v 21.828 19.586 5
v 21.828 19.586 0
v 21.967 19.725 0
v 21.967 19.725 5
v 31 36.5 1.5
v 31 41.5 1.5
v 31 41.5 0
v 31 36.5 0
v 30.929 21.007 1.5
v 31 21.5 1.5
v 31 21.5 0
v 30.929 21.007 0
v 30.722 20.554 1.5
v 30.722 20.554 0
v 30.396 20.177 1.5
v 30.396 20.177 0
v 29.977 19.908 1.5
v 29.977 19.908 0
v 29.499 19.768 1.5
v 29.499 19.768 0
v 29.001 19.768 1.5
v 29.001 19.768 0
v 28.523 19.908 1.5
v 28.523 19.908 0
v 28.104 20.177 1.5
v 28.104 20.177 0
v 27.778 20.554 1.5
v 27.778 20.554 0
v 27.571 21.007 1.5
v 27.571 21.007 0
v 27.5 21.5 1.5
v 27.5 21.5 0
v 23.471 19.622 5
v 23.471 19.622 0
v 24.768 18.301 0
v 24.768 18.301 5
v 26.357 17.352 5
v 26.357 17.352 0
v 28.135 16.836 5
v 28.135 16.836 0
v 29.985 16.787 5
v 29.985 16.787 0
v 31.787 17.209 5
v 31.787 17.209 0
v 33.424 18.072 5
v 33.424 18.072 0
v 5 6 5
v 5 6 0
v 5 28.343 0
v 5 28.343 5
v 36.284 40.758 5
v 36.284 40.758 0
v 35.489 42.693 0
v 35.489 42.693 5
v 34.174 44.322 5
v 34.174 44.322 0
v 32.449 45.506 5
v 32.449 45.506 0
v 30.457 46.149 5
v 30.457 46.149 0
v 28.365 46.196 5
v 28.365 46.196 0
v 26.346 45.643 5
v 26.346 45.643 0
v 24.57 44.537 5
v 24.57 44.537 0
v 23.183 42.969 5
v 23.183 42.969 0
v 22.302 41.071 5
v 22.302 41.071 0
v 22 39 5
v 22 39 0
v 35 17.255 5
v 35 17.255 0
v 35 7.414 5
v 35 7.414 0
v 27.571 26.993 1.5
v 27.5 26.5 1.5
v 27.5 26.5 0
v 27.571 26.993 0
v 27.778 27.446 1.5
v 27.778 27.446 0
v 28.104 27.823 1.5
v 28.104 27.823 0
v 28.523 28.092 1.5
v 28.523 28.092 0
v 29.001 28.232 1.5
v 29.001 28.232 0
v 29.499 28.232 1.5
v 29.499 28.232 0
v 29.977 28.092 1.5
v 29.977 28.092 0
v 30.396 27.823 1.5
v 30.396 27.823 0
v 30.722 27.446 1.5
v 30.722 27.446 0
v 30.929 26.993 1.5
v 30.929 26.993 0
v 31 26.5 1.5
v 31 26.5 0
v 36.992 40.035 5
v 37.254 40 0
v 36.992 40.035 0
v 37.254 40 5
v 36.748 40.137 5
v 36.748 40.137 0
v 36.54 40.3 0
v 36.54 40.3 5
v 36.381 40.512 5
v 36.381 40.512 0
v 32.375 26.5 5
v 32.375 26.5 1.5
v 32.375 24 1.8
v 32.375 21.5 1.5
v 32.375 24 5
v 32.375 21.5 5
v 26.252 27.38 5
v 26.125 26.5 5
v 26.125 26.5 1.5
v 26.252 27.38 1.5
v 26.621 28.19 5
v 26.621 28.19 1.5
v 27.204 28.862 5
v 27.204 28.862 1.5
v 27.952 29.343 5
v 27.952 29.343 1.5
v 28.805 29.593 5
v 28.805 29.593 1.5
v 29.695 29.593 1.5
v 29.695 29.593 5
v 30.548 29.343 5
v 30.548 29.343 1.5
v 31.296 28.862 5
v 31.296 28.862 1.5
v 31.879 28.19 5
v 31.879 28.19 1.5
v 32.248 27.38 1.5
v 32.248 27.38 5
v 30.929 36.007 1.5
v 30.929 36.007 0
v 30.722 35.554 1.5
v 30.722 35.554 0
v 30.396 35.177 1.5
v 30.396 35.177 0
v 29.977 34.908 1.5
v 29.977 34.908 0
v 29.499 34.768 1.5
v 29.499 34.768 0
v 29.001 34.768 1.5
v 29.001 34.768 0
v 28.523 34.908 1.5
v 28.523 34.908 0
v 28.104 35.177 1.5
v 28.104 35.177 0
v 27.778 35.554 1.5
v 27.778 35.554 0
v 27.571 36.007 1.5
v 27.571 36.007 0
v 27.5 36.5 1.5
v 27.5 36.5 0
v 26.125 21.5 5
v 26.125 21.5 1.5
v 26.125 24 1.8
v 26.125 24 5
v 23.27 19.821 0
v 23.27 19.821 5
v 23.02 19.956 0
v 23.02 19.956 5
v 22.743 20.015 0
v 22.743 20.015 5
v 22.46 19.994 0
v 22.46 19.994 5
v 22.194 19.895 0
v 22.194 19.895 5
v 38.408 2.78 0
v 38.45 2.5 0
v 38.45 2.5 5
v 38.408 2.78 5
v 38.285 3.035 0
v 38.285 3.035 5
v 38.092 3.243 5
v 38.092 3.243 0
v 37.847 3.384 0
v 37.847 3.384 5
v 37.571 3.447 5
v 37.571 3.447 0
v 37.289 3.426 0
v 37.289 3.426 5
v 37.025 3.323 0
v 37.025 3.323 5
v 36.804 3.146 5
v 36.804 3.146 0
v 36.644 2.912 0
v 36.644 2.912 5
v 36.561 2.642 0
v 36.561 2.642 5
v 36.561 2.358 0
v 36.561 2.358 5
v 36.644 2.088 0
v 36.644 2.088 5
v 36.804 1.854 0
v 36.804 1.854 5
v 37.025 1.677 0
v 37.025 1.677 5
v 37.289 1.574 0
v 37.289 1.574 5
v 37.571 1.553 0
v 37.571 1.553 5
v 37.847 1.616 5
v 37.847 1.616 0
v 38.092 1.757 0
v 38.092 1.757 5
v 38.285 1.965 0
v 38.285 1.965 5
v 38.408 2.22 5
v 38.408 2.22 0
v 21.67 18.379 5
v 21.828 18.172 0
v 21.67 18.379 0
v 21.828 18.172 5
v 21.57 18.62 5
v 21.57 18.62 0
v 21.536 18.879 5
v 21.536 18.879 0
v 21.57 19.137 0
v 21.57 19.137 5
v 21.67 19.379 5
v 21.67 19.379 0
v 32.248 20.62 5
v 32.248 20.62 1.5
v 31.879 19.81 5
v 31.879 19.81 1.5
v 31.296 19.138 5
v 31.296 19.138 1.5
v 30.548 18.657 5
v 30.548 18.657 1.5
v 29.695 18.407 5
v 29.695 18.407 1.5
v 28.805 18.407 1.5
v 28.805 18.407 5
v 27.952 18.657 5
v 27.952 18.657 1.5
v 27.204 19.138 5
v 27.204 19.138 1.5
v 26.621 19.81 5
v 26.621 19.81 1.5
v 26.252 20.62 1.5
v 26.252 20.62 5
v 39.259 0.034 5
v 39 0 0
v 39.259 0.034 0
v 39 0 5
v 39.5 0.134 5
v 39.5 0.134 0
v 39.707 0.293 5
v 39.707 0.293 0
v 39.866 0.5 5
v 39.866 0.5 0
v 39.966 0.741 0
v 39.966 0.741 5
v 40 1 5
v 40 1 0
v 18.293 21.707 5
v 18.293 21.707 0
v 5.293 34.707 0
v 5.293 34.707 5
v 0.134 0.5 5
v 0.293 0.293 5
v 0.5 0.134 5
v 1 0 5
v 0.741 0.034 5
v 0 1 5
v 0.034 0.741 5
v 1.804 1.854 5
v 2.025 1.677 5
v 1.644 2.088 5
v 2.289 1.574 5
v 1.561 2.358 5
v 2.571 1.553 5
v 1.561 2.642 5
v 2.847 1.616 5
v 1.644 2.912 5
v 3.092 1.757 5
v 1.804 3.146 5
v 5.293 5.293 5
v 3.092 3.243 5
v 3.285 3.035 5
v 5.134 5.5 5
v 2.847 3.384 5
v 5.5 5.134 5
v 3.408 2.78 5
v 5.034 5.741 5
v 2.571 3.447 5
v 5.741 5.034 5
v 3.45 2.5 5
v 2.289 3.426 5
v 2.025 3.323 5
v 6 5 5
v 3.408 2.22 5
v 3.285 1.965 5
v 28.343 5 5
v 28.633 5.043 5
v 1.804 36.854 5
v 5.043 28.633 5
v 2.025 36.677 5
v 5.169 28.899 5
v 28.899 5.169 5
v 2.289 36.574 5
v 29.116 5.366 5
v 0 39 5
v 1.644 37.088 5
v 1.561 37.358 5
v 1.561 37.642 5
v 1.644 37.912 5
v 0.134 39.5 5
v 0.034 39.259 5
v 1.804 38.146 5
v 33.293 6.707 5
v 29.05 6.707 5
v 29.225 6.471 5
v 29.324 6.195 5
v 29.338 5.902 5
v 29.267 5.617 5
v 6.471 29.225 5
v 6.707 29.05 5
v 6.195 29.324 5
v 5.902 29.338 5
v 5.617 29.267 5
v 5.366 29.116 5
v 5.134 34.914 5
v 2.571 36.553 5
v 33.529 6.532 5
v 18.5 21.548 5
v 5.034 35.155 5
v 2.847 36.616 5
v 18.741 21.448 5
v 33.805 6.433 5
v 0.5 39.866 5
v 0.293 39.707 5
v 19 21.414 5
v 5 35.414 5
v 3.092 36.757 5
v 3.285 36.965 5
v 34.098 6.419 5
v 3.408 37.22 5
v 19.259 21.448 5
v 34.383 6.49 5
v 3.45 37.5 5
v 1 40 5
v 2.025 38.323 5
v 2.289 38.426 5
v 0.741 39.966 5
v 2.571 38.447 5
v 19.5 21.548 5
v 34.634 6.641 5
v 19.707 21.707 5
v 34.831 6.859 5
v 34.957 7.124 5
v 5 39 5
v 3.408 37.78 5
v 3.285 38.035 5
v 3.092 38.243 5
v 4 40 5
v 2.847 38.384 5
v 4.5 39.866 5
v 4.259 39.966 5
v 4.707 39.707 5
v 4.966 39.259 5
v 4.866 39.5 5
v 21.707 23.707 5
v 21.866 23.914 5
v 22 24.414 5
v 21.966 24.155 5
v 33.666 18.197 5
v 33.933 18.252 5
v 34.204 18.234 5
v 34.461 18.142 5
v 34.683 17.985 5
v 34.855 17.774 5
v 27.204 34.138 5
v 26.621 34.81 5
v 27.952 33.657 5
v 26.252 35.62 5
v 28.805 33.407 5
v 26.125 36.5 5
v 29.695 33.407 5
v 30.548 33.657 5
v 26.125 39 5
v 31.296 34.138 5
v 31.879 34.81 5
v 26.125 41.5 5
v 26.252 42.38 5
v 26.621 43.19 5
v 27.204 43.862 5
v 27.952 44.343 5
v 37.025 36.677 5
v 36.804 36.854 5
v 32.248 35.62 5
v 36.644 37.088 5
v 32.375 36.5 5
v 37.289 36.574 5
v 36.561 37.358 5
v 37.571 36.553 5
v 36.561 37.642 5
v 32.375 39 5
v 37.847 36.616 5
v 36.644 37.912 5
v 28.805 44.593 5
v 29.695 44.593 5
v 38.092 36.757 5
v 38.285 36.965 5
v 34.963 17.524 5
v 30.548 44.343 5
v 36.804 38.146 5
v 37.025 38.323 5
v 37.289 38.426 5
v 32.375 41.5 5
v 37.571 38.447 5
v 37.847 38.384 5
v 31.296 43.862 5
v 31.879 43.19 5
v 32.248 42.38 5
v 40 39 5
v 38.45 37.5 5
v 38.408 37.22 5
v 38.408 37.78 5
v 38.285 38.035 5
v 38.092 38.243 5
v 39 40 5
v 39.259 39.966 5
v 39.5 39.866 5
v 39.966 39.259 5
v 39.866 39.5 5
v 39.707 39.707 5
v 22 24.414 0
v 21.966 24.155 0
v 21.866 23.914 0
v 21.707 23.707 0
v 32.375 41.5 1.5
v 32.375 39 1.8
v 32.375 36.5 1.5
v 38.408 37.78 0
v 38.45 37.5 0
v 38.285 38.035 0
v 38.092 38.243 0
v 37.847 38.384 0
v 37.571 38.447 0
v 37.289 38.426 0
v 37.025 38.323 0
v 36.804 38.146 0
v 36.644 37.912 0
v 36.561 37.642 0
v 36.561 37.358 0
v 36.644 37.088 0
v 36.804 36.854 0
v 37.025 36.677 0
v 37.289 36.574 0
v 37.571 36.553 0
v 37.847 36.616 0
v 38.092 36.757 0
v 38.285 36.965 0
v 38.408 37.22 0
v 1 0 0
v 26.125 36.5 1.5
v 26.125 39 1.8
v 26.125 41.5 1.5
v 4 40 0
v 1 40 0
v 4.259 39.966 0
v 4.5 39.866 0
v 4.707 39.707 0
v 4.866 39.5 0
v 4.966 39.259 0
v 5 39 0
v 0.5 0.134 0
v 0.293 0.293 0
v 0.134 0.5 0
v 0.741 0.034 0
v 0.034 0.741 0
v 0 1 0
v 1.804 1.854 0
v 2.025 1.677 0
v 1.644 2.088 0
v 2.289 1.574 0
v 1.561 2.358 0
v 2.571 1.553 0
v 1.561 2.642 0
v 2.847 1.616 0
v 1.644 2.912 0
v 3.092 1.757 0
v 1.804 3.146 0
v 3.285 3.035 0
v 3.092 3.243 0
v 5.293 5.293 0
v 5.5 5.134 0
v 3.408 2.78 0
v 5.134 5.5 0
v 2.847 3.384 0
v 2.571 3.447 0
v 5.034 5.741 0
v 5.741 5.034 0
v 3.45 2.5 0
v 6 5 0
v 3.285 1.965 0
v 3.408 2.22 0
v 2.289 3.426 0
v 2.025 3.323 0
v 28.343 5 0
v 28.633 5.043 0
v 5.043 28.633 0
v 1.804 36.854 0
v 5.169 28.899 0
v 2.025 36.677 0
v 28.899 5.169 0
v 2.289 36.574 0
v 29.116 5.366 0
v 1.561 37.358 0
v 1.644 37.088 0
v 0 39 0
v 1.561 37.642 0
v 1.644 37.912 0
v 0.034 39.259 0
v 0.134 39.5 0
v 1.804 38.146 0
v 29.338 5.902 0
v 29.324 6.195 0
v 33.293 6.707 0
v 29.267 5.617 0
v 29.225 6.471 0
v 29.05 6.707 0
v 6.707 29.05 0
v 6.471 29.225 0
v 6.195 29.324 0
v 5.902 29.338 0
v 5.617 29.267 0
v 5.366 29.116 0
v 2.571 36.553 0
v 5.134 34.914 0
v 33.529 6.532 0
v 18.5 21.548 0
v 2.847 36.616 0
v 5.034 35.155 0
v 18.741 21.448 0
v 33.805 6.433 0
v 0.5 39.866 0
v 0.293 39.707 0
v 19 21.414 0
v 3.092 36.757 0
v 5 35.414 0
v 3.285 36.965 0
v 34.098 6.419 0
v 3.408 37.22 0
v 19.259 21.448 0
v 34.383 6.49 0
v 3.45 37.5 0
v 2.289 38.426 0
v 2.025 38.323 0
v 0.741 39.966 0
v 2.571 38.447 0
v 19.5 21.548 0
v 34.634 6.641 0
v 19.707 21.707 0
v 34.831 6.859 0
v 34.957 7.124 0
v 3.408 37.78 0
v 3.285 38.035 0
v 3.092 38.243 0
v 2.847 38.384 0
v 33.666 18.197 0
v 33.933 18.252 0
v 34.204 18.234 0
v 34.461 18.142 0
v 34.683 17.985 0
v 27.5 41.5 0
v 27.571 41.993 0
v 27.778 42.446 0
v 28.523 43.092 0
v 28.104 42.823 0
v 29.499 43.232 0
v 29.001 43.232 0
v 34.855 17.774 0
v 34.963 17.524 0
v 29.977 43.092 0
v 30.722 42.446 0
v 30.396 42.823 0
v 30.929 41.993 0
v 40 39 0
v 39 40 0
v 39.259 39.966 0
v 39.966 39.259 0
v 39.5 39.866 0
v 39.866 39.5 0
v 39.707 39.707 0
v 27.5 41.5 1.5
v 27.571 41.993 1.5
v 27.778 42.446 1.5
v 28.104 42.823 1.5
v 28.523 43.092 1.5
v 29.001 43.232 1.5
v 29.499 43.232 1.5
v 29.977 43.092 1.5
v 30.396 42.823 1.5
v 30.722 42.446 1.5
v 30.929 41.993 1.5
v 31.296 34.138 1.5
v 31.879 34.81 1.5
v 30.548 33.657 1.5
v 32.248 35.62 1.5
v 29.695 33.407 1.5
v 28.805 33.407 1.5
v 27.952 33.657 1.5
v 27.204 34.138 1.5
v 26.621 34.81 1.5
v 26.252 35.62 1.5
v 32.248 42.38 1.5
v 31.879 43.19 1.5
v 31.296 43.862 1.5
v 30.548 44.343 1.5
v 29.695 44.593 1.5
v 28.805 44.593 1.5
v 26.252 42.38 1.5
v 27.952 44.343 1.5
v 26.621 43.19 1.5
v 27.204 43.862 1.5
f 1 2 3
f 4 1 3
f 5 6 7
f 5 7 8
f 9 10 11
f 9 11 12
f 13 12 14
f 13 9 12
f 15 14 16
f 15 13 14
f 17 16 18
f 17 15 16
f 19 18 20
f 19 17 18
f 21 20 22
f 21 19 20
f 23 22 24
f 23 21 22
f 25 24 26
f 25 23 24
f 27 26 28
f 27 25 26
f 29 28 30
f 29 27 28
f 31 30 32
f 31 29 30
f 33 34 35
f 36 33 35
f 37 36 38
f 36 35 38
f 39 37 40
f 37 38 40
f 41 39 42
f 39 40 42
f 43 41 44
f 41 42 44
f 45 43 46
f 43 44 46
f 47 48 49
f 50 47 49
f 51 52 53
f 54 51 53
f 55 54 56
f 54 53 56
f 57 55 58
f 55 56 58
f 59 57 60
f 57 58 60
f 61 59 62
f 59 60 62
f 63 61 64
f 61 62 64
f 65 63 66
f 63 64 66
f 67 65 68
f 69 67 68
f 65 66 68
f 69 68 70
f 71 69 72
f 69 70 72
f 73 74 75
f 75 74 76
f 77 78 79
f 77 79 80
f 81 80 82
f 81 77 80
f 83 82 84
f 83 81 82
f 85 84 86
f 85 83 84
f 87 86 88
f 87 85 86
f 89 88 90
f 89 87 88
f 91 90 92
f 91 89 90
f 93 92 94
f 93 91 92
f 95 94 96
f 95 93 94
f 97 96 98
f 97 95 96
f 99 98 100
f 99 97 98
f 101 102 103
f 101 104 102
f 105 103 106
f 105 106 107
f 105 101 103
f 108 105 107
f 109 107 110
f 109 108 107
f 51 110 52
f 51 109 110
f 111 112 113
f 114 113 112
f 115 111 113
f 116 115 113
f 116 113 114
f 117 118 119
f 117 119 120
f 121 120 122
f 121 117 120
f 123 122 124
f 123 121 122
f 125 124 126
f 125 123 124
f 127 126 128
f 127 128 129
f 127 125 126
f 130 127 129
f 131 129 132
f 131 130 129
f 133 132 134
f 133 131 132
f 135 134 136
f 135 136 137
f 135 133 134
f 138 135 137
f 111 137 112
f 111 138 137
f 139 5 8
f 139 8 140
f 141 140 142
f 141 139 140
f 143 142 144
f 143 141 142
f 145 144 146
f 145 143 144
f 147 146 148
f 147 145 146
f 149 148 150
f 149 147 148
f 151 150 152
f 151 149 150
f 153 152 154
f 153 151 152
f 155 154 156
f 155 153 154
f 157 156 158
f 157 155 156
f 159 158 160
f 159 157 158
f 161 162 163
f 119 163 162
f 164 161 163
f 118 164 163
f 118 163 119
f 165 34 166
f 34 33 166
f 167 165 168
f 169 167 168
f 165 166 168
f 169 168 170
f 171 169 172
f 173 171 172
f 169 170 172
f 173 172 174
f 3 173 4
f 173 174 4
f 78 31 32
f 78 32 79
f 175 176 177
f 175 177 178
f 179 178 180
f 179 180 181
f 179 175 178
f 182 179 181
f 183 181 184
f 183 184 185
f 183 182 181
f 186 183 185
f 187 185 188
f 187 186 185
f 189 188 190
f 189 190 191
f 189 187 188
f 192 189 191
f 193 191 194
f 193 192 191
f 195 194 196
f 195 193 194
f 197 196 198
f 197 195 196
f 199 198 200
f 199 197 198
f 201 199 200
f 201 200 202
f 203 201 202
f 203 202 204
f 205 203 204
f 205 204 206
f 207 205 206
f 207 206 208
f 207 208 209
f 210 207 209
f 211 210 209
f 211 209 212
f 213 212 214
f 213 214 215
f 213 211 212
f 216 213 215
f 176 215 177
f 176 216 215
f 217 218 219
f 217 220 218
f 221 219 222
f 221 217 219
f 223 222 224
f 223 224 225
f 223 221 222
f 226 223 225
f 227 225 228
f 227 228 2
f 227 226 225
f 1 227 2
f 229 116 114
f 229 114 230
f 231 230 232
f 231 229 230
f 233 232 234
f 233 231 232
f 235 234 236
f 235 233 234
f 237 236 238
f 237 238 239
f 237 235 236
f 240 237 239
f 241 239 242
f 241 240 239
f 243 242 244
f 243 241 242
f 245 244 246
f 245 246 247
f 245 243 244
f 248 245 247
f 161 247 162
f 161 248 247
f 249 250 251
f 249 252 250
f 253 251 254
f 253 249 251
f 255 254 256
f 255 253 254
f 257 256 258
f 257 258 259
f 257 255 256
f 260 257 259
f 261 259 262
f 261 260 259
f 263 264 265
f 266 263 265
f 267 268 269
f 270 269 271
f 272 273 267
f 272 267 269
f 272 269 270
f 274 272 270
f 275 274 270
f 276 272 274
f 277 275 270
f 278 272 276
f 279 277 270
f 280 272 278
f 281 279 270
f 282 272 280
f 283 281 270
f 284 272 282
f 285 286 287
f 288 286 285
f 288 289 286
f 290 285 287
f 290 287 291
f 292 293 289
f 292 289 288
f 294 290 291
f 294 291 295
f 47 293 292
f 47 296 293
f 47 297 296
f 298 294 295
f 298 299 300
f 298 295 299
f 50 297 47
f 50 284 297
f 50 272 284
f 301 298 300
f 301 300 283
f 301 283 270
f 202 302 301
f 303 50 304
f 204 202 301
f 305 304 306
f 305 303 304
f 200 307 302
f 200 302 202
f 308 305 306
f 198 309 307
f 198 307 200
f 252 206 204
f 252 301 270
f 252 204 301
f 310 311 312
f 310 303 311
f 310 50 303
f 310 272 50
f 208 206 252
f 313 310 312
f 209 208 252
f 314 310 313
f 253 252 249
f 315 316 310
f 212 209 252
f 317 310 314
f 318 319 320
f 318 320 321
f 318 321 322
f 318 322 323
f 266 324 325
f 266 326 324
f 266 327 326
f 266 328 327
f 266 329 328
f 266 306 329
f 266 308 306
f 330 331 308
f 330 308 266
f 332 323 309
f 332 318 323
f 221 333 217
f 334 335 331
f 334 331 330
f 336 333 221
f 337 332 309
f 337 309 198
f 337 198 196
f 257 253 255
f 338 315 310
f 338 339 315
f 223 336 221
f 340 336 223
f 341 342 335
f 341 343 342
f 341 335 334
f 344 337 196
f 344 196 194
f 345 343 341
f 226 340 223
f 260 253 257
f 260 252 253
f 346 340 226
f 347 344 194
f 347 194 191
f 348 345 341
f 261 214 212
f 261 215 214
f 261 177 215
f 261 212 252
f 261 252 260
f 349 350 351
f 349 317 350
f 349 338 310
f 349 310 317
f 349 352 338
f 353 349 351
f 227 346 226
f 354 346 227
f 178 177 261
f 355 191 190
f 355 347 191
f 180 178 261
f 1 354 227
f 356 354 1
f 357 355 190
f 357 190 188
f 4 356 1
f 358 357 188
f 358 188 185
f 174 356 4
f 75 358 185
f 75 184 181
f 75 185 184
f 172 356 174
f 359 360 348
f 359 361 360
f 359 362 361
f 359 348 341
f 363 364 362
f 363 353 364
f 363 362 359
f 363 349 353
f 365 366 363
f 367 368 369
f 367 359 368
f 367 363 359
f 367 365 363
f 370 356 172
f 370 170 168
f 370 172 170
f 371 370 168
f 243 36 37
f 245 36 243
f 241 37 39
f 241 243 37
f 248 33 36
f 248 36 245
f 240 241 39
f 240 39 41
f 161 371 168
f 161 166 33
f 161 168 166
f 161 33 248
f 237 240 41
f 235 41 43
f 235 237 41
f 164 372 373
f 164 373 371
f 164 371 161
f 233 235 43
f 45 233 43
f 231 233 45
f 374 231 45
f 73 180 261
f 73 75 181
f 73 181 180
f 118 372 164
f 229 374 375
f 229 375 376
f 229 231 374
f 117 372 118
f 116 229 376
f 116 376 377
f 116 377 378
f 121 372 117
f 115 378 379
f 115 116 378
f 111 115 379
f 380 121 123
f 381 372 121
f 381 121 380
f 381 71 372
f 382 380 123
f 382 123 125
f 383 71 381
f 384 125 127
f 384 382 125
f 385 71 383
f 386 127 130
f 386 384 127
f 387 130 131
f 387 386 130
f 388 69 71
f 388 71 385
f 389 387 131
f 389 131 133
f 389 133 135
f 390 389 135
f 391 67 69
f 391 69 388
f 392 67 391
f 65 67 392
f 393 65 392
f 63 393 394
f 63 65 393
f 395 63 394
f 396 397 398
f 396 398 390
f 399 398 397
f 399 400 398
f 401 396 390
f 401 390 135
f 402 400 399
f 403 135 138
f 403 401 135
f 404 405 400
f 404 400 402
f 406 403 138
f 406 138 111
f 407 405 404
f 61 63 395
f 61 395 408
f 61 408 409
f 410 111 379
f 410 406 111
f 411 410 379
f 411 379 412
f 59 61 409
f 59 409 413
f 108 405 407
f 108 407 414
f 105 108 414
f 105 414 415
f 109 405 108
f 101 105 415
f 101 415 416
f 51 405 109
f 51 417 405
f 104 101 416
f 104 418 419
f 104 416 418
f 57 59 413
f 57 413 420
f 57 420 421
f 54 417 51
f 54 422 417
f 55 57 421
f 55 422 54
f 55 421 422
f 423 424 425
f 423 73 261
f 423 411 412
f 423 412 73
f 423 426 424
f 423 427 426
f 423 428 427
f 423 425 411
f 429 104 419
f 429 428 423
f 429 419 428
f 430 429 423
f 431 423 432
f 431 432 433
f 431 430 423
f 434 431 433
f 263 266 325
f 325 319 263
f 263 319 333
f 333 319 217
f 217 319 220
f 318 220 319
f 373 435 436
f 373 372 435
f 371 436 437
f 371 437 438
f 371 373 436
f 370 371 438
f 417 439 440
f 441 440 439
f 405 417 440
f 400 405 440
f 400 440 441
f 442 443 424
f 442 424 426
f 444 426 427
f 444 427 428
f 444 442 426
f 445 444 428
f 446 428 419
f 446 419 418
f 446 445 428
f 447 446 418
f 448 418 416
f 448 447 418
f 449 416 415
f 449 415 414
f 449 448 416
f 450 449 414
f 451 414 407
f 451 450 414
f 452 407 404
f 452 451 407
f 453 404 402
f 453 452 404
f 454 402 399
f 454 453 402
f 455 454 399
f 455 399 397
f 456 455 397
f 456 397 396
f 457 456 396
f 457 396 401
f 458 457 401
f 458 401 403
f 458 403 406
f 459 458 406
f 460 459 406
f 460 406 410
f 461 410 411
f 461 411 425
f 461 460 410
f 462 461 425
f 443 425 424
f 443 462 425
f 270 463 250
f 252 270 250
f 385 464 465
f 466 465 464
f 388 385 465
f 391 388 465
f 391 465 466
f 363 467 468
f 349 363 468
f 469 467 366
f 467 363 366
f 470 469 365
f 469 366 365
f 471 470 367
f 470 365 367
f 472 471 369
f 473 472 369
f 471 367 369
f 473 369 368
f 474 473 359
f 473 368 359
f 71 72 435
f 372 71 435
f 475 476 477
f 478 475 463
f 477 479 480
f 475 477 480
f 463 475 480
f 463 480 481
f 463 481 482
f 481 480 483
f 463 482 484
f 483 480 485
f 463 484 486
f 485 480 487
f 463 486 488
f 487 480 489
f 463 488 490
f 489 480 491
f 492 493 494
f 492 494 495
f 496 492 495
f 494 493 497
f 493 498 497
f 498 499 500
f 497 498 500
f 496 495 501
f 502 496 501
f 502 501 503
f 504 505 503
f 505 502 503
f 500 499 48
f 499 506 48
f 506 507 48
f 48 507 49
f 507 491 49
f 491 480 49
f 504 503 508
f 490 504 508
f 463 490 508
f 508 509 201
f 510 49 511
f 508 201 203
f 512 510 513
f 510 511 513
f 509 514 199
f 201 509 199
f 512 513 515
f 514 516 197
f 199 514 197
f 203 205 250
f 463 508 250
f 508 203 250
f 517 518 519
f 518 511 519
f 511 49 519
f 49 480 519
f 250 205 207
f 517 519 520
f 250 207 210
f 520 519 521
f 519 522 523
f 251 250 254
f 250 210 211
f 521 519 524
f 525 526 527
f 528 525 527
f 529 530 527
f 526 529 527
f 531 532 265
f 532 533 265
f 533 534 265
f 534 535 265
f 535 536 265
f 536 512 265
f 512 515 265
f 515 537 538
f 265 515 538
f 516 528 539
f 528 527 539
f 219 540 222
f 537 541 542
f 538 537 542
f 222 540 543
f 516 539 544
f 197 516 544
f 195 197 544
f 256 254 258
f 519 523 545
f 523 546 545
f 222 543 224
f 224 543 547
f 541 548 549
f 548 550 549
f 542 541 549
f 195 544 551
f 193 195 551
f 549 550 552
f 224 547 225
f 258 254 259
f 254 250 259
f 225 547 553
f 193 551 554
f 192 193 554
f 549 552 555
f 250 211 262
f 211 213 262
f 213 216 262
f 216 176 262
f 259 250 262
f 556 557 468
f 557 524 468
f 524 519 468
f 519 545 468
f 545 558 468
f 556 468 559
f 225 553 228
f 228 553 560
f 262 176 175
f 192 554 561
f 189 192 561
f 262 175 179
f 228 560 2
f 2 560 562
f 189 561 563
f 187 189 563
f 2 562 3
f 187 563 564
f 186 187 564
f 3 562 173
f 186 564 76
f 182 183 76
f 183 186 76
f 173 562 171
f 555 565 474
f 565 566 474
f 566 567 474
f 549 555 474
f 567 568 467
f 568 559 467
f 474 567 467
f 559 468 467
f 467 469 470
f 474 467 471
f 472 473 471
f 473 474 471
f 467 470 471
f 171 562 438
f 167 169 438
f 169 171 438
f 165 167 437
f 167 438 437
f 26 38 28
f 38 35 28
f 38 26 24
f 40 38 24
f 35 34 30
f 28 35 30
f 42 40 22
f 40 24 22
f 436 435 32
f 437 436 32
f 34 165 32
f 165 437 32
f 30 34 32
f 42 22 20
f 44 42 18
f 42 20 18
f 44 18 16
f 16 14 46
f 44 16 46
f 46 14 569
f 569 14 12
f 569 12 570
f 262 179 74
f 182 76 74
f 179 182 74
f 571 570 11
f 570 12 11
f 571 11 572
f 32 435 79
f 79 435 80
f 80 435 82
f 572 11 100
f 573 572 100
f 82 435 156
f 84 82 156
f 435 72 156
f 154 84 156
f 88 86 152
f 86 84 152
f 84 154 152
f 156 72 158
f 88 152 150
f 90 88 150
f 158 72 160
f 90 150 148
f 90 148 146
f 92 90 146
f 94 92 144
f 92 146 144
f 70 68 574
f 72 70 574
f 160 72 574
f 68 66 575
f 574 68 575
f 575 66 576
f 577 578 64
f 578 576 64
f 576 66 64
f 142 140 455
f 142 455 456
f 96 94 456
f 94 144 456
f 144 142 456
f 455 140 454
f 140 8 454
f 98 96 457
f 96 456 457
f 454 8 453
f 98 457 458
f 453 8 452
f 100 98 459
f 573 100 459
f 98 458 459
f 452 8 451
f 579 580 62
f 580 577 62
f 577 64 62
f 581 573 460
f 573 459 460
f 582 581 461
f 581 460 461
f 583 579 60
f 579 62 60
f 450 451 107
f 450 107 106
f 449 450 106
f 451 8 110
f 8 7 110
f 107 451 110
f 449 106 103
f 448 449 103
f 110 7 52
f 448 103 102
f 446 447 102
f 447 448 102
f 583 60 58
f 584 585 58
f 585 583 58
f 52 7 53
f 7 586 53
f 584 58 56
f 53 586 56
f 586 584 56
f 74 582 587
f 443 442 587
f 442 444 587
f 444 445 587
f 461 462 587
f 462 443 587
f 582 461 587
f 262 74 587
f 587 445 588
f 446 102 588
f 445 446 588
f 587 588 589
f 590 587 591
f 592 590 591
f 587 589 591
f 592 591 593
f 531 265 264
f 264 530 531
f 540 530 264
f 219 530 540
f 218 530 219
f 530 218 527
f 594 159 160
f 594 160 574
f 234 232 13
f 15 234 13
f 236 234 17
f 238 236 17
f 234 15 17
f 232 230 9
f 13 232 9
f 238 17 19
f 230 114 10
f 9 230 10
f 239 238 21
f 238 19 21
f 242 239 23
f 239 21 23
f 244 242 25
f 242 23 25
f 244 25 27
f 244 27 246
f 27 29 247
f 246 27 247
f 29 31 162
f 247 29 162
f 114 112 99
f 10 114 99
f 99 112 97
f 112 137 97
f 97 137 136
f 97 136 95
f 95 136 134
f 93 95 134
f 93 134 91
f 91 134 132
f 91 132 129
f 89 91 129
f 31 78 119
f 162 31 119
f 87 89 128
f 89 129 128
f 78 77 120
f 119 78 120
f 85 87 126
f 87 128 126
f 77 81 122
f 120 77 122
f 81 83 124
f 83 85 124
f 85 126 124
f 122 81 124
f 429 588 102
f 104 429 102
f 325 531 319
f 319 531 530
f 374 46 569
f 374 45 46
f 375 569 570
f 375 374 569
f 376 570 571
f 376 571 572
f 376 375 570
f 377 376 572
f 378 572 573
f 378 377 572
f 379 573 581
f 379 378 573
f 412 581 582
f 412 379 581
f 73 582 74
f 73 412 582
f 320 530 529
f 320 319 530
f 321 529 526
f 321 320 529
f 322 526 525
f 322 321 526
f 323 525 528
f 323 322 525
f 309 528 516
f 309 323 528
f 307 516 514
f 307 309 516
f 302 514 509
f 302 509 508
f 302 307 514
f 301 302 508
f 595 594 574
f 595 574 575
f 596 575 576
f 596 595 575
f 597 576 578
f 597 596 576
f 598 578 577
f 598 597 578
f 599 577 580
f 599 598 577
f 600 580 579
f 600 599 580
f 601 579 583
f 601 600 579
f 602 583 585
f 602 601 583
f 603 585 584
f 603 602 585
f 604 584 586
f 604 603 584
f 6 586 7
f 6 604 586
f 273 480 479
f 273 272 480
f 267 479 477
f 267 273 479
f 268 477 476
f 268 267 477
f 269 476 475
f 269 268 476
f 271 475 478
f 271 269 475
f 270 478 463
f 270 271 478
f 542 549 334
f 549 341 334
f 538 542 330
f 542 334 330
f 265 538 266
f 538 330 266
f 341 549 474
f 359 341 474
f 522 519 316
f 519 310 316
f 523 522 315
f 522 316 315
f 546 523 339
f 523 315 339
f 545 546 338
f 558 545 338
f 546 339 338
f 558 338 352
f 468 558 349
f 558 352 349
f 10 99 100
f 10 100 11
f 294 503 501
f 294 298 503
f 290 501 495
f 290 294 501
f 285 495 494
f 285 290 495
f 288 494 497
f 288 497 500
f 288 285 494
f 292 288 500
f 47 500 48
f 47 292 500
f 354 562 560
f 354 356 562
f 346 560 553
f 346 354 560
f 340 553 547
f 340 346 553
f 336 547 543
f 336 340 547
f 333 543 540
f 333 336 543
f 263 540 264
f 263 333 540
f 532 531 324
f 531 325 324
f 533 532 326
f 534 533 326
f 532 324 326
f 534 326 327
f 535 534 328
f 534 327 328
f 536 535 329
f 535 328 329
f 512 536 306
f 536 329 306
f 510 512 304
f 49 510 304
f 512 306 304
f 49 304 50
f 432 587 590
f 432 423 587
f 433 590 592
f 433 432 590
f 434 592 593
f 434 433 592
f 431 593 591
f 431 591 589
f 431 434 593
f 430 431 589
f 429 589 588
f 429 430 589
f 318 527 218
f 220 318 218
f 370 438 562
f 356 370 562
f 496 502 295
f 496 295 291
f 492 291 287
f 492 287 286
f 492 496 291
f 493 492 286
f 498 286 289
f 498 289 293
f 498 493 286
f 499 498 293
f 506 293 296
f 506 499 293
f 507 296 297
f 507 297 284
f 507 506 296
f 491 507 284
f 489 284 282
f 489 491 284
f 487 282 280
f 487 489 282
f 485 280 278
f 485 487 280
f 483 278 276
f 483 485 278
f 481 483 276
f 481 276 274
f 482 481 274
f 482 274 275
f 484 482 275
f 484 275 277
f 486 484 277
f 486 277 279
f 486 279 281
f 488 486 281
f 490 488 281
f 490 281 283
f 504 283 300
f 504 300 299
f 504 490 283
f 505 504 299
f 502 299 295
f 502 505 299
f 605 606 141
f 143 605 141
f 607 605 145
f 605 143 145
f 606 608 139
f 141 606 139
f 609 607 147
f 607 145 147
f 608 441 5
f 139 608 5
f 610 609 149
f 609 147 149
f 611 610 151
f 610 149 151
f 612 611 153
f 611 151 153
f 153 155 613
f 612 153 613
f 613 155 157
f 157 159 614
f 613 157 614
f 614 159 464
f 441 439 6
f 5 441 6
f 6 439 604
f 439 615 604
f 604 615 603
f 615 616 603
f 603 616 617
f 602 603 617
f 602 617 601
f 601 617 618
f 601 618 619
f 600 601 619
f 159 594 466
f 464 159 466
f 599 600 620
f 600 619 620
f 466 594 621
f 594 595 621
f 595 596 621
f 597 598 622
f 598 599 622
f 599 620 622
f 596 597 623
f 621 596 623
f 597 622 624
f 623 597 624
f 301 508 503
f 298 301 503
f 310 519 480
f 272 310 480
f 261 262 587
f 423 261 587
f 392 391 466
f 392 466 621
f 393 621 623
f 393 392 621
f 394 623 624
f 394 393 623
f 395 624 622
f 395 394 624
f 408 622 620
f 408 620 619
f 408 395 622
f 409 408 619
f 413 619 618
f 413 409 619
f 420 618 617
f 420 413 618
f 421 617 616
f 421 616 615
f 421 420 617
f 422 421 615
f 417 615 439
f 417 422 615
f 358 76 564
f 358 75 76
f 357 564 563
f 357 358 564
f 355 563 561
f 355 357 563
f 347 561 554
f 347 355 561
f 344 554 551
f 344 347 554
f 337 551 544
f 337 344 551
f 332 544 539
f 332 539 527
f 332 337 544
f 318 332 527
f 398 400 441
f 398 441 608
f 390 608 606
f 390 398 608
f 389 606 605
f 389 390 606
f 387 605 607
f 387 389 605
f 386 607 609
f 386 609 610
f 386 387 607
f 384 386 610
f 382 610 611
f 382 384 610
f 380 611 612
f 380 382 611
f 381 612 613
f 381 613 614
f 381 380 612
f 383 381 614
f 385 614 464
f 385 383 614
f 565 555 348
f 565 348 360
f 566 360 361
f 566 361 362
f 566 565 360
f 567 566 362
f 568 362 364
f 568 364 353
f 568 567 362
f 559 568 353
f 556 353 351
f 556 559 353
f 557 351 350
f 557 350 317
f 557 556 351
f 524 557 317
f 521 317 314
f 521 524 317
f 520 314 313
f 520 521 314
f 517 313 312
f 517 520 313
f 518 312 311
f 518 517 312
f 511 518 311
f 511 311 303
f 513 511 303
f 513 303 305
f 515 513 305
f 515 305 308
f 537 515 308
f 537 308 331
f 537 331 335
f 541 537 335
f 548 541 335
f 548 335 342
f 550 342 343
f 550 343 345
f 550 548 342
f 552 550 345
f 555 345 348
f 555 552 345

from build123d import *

# Parameters (mm, degrees)
SKETCH1_R           = 0.95
SKETCH1_R_2         = 1.75
BOSS_EXTRUDE1_DEPTH = 5
SKETCH6_R           = 3.125
CUT_EXTRUDE1_DEPTH  = 3.2
CUT_EXTRUDE2_DEPTH  = 62.351955959
CUT_EXTRUDE3_DEPTH  = 3.5
FILLET1_R           = 1


with BuildPart() as part:
    # Sketch1 → Boss-Extrude1 (new body)
    with BuildSketch(Plane.XY):
        with BuildLine():
            Line((0, 40), (0, 0))
            Line((0, 0), (40, 0))
            Line((40, 0), (40, 40))
            Line((40, 40), (36.430703308, 40))
            ThreePointArc((36.430703308, 40), (28.74880093, 46.232655079), (22, 39))
            Line((22, 39), (22, 24))
            Line((22, 24), (19, 21))
            Line((19, 21), (5, 35))
            Line((5, 35), (5, 40))
            Line((5, 40), (0, 40))
        make_face()
        Polygon((5, 5), (5, 30.757359313), (30.757359313, 5), align=None, mode=Mode.SUBTRACT)
        with BuildLine():
            Line((35, 19.584119567), (35, 5))
            Line((35, 5), (21.121320344, 18.878679656))
            Line((21.121320344, 18.878679656), (22.845279894, 20.602639207))
            ThreePointArc((22.845279894, 20.602639207), (28.644599167, 16.77532078), (35, 19.584119567))
        make_face(mode=Mode.SUBTRACT)
        with Locations((2.5, 2.5)):
            Circle(SKETCH1_R, mode=Mode.SUBTRACT)
        with Locations((37.5, 2.5)):
            Circle(SKETCH1_R, mode=Mode.SUBTRACT)
        with Locations((2.5, 37.5)):
            Circle(SKETCH1_R, mode=Mode.SUBTRACT)
        with Locations((37.5, 37.5)):
            Circle(SKETCH1_R, mode=Mode.SUBTRACT)
        with Locations((29.25, 39)):
            Circle(SKETCH1_R_2, mode=Mode.SUBTRACT)
        with Locations((29.25, 24)):
            Circle(SKETCH1_R_2, mode=Mode.SUBTRACT)
    extrude(amount=BOSS_EXTRUDE1_DEPTH)

    # Sketch6 → Cut-Extrude1 (cut)
    with BuildSketch(Plane.XY.offset(5)):
        with Locations((29.25, 39)):
            Circle(SKETCH6_R)
        with Locations((29.25, 24)):
            Circle(SKETCH6_R)
    extrude(amount=-CUT_EXTRUDE1_DEPTH, mode=Mode.SUBTRACT)

    # Sketch7 → Cut-Extrude2 (cut, through all)
    with BuildSketch(Plane.XY.offset(5)):
        with BuildLine():
            Line((27.5, 26.5), (27.5, 21.5))
            ThreePointArc((27.5, 21.5), (29.25, 19.75), (31, 21.5))
            Line((31, 21.5), (31, 26.5))
            ThreePointArc((31, 26.5), (29.25, 28.25), (27.5, 26.5))
        make_face()
        with BuildLine():
            Line((27.5, 41.5), (27.5, 36.5))
            ThreePointArc((27.5, 36.5), (29.25, 34.75), (31, 36.5))
            Line((31, 36.5), (31, 41.5))
            ThreePointArc((31, 41.5), (29.25, 43.25), (27.5, 41.5))
        make_face()
    extrude(amount=-CUT_EXTRUDE2_DEPTH, mode=Mode.SUBTRACT)

    # Sketch7<3> → Cut-Extrude3 (cut)
    # profile 1 of 2: a face of its own
    with BuildSketch(Plane.XY.offset(5)):
        with BuildLine():
            Line((32.375, 26.5), (32.375, 21.5))
            ThreePointArc((32.375, 21.5), (29.25, 18.375), (26.125, 21.5))
            Line((26.125, 21.5), (26.125, 26.5))
            ThreePointArc((26.125, 26.5), (29.25, 29.625), (32.375, 26.5))
        make_face()
        with BuildLine():
            Line((31, 26.5), (31, 21.5))
            ThreePointArc((31, 21.5), (29.25, 19.75), (27.5, 21.5))
            Line((27.5, 21.5), (27.5, 26.5))
            ThreePointArc((27.5, 26.5), (29.25, 28.25), (31, 26.5))
        make_face(mode=Mode.SUBTRACT)
    # profile 2 of 2: a face of its own
    with BuildSketch(Plane.XY.offset(5)):
        with BuildLine():
            Line((32.375, 41.5), (32.375, 36.5))
            ThreePointArc((32.375, 36.5), (29.25, 33.375), (26.125, 36.5))
            Line((26.125, 36.5), (26.125, 41.5))
            ThreePointArc((26.125, 41.5), (29.25, 44.625), (32.375, 41.5))
        make_face()
        with BuildLine():
            Line((31, 41.5), (31, 36.5))
            ThreePointArc((31, 36.5), (29.25, 34.75), (27.5, 36.5))
            Line((27.5, 36.5), (27.5, 41.5))
            ThreePointArc((27.5, 41.5), (29.25, 43.25), (31, 41.5))
        make_face(mode=Mode.SUBTRACT)
    extrude(amount=-CUT_EXTRUDE3_DEPTH, mode=Mode.SUBTRACT)

    # Fillet1
    fillet1_edges = [part.edges().sort_by_distance(p)[0] for p in [
        (5, 30.757359313, 2.5),
        (40, 40, 2.5),
        (36.430703308, 40, 2.5),
        (35, 19.584119567, 2.5),
        (22.845279894, 20.602639207, 2.5),
        (21.121320344, 18.878679656, 2.5),
        (22, 24, 2.5),
        (19, 21, 2.5),
        (30.757359313, 5, 2.5),
        (35, 5, 2.5),
        (5, 5, 2.5),
        (5, 35, 2.5),
        (5, 40, 2.5),
        (0, 40, 2.5),
        (40, 0, 2.5),
        (0, 0, 2.5),
    ]]
    fillet(fillet1_edges, radius=FILLET1_R)


solid = part.part
